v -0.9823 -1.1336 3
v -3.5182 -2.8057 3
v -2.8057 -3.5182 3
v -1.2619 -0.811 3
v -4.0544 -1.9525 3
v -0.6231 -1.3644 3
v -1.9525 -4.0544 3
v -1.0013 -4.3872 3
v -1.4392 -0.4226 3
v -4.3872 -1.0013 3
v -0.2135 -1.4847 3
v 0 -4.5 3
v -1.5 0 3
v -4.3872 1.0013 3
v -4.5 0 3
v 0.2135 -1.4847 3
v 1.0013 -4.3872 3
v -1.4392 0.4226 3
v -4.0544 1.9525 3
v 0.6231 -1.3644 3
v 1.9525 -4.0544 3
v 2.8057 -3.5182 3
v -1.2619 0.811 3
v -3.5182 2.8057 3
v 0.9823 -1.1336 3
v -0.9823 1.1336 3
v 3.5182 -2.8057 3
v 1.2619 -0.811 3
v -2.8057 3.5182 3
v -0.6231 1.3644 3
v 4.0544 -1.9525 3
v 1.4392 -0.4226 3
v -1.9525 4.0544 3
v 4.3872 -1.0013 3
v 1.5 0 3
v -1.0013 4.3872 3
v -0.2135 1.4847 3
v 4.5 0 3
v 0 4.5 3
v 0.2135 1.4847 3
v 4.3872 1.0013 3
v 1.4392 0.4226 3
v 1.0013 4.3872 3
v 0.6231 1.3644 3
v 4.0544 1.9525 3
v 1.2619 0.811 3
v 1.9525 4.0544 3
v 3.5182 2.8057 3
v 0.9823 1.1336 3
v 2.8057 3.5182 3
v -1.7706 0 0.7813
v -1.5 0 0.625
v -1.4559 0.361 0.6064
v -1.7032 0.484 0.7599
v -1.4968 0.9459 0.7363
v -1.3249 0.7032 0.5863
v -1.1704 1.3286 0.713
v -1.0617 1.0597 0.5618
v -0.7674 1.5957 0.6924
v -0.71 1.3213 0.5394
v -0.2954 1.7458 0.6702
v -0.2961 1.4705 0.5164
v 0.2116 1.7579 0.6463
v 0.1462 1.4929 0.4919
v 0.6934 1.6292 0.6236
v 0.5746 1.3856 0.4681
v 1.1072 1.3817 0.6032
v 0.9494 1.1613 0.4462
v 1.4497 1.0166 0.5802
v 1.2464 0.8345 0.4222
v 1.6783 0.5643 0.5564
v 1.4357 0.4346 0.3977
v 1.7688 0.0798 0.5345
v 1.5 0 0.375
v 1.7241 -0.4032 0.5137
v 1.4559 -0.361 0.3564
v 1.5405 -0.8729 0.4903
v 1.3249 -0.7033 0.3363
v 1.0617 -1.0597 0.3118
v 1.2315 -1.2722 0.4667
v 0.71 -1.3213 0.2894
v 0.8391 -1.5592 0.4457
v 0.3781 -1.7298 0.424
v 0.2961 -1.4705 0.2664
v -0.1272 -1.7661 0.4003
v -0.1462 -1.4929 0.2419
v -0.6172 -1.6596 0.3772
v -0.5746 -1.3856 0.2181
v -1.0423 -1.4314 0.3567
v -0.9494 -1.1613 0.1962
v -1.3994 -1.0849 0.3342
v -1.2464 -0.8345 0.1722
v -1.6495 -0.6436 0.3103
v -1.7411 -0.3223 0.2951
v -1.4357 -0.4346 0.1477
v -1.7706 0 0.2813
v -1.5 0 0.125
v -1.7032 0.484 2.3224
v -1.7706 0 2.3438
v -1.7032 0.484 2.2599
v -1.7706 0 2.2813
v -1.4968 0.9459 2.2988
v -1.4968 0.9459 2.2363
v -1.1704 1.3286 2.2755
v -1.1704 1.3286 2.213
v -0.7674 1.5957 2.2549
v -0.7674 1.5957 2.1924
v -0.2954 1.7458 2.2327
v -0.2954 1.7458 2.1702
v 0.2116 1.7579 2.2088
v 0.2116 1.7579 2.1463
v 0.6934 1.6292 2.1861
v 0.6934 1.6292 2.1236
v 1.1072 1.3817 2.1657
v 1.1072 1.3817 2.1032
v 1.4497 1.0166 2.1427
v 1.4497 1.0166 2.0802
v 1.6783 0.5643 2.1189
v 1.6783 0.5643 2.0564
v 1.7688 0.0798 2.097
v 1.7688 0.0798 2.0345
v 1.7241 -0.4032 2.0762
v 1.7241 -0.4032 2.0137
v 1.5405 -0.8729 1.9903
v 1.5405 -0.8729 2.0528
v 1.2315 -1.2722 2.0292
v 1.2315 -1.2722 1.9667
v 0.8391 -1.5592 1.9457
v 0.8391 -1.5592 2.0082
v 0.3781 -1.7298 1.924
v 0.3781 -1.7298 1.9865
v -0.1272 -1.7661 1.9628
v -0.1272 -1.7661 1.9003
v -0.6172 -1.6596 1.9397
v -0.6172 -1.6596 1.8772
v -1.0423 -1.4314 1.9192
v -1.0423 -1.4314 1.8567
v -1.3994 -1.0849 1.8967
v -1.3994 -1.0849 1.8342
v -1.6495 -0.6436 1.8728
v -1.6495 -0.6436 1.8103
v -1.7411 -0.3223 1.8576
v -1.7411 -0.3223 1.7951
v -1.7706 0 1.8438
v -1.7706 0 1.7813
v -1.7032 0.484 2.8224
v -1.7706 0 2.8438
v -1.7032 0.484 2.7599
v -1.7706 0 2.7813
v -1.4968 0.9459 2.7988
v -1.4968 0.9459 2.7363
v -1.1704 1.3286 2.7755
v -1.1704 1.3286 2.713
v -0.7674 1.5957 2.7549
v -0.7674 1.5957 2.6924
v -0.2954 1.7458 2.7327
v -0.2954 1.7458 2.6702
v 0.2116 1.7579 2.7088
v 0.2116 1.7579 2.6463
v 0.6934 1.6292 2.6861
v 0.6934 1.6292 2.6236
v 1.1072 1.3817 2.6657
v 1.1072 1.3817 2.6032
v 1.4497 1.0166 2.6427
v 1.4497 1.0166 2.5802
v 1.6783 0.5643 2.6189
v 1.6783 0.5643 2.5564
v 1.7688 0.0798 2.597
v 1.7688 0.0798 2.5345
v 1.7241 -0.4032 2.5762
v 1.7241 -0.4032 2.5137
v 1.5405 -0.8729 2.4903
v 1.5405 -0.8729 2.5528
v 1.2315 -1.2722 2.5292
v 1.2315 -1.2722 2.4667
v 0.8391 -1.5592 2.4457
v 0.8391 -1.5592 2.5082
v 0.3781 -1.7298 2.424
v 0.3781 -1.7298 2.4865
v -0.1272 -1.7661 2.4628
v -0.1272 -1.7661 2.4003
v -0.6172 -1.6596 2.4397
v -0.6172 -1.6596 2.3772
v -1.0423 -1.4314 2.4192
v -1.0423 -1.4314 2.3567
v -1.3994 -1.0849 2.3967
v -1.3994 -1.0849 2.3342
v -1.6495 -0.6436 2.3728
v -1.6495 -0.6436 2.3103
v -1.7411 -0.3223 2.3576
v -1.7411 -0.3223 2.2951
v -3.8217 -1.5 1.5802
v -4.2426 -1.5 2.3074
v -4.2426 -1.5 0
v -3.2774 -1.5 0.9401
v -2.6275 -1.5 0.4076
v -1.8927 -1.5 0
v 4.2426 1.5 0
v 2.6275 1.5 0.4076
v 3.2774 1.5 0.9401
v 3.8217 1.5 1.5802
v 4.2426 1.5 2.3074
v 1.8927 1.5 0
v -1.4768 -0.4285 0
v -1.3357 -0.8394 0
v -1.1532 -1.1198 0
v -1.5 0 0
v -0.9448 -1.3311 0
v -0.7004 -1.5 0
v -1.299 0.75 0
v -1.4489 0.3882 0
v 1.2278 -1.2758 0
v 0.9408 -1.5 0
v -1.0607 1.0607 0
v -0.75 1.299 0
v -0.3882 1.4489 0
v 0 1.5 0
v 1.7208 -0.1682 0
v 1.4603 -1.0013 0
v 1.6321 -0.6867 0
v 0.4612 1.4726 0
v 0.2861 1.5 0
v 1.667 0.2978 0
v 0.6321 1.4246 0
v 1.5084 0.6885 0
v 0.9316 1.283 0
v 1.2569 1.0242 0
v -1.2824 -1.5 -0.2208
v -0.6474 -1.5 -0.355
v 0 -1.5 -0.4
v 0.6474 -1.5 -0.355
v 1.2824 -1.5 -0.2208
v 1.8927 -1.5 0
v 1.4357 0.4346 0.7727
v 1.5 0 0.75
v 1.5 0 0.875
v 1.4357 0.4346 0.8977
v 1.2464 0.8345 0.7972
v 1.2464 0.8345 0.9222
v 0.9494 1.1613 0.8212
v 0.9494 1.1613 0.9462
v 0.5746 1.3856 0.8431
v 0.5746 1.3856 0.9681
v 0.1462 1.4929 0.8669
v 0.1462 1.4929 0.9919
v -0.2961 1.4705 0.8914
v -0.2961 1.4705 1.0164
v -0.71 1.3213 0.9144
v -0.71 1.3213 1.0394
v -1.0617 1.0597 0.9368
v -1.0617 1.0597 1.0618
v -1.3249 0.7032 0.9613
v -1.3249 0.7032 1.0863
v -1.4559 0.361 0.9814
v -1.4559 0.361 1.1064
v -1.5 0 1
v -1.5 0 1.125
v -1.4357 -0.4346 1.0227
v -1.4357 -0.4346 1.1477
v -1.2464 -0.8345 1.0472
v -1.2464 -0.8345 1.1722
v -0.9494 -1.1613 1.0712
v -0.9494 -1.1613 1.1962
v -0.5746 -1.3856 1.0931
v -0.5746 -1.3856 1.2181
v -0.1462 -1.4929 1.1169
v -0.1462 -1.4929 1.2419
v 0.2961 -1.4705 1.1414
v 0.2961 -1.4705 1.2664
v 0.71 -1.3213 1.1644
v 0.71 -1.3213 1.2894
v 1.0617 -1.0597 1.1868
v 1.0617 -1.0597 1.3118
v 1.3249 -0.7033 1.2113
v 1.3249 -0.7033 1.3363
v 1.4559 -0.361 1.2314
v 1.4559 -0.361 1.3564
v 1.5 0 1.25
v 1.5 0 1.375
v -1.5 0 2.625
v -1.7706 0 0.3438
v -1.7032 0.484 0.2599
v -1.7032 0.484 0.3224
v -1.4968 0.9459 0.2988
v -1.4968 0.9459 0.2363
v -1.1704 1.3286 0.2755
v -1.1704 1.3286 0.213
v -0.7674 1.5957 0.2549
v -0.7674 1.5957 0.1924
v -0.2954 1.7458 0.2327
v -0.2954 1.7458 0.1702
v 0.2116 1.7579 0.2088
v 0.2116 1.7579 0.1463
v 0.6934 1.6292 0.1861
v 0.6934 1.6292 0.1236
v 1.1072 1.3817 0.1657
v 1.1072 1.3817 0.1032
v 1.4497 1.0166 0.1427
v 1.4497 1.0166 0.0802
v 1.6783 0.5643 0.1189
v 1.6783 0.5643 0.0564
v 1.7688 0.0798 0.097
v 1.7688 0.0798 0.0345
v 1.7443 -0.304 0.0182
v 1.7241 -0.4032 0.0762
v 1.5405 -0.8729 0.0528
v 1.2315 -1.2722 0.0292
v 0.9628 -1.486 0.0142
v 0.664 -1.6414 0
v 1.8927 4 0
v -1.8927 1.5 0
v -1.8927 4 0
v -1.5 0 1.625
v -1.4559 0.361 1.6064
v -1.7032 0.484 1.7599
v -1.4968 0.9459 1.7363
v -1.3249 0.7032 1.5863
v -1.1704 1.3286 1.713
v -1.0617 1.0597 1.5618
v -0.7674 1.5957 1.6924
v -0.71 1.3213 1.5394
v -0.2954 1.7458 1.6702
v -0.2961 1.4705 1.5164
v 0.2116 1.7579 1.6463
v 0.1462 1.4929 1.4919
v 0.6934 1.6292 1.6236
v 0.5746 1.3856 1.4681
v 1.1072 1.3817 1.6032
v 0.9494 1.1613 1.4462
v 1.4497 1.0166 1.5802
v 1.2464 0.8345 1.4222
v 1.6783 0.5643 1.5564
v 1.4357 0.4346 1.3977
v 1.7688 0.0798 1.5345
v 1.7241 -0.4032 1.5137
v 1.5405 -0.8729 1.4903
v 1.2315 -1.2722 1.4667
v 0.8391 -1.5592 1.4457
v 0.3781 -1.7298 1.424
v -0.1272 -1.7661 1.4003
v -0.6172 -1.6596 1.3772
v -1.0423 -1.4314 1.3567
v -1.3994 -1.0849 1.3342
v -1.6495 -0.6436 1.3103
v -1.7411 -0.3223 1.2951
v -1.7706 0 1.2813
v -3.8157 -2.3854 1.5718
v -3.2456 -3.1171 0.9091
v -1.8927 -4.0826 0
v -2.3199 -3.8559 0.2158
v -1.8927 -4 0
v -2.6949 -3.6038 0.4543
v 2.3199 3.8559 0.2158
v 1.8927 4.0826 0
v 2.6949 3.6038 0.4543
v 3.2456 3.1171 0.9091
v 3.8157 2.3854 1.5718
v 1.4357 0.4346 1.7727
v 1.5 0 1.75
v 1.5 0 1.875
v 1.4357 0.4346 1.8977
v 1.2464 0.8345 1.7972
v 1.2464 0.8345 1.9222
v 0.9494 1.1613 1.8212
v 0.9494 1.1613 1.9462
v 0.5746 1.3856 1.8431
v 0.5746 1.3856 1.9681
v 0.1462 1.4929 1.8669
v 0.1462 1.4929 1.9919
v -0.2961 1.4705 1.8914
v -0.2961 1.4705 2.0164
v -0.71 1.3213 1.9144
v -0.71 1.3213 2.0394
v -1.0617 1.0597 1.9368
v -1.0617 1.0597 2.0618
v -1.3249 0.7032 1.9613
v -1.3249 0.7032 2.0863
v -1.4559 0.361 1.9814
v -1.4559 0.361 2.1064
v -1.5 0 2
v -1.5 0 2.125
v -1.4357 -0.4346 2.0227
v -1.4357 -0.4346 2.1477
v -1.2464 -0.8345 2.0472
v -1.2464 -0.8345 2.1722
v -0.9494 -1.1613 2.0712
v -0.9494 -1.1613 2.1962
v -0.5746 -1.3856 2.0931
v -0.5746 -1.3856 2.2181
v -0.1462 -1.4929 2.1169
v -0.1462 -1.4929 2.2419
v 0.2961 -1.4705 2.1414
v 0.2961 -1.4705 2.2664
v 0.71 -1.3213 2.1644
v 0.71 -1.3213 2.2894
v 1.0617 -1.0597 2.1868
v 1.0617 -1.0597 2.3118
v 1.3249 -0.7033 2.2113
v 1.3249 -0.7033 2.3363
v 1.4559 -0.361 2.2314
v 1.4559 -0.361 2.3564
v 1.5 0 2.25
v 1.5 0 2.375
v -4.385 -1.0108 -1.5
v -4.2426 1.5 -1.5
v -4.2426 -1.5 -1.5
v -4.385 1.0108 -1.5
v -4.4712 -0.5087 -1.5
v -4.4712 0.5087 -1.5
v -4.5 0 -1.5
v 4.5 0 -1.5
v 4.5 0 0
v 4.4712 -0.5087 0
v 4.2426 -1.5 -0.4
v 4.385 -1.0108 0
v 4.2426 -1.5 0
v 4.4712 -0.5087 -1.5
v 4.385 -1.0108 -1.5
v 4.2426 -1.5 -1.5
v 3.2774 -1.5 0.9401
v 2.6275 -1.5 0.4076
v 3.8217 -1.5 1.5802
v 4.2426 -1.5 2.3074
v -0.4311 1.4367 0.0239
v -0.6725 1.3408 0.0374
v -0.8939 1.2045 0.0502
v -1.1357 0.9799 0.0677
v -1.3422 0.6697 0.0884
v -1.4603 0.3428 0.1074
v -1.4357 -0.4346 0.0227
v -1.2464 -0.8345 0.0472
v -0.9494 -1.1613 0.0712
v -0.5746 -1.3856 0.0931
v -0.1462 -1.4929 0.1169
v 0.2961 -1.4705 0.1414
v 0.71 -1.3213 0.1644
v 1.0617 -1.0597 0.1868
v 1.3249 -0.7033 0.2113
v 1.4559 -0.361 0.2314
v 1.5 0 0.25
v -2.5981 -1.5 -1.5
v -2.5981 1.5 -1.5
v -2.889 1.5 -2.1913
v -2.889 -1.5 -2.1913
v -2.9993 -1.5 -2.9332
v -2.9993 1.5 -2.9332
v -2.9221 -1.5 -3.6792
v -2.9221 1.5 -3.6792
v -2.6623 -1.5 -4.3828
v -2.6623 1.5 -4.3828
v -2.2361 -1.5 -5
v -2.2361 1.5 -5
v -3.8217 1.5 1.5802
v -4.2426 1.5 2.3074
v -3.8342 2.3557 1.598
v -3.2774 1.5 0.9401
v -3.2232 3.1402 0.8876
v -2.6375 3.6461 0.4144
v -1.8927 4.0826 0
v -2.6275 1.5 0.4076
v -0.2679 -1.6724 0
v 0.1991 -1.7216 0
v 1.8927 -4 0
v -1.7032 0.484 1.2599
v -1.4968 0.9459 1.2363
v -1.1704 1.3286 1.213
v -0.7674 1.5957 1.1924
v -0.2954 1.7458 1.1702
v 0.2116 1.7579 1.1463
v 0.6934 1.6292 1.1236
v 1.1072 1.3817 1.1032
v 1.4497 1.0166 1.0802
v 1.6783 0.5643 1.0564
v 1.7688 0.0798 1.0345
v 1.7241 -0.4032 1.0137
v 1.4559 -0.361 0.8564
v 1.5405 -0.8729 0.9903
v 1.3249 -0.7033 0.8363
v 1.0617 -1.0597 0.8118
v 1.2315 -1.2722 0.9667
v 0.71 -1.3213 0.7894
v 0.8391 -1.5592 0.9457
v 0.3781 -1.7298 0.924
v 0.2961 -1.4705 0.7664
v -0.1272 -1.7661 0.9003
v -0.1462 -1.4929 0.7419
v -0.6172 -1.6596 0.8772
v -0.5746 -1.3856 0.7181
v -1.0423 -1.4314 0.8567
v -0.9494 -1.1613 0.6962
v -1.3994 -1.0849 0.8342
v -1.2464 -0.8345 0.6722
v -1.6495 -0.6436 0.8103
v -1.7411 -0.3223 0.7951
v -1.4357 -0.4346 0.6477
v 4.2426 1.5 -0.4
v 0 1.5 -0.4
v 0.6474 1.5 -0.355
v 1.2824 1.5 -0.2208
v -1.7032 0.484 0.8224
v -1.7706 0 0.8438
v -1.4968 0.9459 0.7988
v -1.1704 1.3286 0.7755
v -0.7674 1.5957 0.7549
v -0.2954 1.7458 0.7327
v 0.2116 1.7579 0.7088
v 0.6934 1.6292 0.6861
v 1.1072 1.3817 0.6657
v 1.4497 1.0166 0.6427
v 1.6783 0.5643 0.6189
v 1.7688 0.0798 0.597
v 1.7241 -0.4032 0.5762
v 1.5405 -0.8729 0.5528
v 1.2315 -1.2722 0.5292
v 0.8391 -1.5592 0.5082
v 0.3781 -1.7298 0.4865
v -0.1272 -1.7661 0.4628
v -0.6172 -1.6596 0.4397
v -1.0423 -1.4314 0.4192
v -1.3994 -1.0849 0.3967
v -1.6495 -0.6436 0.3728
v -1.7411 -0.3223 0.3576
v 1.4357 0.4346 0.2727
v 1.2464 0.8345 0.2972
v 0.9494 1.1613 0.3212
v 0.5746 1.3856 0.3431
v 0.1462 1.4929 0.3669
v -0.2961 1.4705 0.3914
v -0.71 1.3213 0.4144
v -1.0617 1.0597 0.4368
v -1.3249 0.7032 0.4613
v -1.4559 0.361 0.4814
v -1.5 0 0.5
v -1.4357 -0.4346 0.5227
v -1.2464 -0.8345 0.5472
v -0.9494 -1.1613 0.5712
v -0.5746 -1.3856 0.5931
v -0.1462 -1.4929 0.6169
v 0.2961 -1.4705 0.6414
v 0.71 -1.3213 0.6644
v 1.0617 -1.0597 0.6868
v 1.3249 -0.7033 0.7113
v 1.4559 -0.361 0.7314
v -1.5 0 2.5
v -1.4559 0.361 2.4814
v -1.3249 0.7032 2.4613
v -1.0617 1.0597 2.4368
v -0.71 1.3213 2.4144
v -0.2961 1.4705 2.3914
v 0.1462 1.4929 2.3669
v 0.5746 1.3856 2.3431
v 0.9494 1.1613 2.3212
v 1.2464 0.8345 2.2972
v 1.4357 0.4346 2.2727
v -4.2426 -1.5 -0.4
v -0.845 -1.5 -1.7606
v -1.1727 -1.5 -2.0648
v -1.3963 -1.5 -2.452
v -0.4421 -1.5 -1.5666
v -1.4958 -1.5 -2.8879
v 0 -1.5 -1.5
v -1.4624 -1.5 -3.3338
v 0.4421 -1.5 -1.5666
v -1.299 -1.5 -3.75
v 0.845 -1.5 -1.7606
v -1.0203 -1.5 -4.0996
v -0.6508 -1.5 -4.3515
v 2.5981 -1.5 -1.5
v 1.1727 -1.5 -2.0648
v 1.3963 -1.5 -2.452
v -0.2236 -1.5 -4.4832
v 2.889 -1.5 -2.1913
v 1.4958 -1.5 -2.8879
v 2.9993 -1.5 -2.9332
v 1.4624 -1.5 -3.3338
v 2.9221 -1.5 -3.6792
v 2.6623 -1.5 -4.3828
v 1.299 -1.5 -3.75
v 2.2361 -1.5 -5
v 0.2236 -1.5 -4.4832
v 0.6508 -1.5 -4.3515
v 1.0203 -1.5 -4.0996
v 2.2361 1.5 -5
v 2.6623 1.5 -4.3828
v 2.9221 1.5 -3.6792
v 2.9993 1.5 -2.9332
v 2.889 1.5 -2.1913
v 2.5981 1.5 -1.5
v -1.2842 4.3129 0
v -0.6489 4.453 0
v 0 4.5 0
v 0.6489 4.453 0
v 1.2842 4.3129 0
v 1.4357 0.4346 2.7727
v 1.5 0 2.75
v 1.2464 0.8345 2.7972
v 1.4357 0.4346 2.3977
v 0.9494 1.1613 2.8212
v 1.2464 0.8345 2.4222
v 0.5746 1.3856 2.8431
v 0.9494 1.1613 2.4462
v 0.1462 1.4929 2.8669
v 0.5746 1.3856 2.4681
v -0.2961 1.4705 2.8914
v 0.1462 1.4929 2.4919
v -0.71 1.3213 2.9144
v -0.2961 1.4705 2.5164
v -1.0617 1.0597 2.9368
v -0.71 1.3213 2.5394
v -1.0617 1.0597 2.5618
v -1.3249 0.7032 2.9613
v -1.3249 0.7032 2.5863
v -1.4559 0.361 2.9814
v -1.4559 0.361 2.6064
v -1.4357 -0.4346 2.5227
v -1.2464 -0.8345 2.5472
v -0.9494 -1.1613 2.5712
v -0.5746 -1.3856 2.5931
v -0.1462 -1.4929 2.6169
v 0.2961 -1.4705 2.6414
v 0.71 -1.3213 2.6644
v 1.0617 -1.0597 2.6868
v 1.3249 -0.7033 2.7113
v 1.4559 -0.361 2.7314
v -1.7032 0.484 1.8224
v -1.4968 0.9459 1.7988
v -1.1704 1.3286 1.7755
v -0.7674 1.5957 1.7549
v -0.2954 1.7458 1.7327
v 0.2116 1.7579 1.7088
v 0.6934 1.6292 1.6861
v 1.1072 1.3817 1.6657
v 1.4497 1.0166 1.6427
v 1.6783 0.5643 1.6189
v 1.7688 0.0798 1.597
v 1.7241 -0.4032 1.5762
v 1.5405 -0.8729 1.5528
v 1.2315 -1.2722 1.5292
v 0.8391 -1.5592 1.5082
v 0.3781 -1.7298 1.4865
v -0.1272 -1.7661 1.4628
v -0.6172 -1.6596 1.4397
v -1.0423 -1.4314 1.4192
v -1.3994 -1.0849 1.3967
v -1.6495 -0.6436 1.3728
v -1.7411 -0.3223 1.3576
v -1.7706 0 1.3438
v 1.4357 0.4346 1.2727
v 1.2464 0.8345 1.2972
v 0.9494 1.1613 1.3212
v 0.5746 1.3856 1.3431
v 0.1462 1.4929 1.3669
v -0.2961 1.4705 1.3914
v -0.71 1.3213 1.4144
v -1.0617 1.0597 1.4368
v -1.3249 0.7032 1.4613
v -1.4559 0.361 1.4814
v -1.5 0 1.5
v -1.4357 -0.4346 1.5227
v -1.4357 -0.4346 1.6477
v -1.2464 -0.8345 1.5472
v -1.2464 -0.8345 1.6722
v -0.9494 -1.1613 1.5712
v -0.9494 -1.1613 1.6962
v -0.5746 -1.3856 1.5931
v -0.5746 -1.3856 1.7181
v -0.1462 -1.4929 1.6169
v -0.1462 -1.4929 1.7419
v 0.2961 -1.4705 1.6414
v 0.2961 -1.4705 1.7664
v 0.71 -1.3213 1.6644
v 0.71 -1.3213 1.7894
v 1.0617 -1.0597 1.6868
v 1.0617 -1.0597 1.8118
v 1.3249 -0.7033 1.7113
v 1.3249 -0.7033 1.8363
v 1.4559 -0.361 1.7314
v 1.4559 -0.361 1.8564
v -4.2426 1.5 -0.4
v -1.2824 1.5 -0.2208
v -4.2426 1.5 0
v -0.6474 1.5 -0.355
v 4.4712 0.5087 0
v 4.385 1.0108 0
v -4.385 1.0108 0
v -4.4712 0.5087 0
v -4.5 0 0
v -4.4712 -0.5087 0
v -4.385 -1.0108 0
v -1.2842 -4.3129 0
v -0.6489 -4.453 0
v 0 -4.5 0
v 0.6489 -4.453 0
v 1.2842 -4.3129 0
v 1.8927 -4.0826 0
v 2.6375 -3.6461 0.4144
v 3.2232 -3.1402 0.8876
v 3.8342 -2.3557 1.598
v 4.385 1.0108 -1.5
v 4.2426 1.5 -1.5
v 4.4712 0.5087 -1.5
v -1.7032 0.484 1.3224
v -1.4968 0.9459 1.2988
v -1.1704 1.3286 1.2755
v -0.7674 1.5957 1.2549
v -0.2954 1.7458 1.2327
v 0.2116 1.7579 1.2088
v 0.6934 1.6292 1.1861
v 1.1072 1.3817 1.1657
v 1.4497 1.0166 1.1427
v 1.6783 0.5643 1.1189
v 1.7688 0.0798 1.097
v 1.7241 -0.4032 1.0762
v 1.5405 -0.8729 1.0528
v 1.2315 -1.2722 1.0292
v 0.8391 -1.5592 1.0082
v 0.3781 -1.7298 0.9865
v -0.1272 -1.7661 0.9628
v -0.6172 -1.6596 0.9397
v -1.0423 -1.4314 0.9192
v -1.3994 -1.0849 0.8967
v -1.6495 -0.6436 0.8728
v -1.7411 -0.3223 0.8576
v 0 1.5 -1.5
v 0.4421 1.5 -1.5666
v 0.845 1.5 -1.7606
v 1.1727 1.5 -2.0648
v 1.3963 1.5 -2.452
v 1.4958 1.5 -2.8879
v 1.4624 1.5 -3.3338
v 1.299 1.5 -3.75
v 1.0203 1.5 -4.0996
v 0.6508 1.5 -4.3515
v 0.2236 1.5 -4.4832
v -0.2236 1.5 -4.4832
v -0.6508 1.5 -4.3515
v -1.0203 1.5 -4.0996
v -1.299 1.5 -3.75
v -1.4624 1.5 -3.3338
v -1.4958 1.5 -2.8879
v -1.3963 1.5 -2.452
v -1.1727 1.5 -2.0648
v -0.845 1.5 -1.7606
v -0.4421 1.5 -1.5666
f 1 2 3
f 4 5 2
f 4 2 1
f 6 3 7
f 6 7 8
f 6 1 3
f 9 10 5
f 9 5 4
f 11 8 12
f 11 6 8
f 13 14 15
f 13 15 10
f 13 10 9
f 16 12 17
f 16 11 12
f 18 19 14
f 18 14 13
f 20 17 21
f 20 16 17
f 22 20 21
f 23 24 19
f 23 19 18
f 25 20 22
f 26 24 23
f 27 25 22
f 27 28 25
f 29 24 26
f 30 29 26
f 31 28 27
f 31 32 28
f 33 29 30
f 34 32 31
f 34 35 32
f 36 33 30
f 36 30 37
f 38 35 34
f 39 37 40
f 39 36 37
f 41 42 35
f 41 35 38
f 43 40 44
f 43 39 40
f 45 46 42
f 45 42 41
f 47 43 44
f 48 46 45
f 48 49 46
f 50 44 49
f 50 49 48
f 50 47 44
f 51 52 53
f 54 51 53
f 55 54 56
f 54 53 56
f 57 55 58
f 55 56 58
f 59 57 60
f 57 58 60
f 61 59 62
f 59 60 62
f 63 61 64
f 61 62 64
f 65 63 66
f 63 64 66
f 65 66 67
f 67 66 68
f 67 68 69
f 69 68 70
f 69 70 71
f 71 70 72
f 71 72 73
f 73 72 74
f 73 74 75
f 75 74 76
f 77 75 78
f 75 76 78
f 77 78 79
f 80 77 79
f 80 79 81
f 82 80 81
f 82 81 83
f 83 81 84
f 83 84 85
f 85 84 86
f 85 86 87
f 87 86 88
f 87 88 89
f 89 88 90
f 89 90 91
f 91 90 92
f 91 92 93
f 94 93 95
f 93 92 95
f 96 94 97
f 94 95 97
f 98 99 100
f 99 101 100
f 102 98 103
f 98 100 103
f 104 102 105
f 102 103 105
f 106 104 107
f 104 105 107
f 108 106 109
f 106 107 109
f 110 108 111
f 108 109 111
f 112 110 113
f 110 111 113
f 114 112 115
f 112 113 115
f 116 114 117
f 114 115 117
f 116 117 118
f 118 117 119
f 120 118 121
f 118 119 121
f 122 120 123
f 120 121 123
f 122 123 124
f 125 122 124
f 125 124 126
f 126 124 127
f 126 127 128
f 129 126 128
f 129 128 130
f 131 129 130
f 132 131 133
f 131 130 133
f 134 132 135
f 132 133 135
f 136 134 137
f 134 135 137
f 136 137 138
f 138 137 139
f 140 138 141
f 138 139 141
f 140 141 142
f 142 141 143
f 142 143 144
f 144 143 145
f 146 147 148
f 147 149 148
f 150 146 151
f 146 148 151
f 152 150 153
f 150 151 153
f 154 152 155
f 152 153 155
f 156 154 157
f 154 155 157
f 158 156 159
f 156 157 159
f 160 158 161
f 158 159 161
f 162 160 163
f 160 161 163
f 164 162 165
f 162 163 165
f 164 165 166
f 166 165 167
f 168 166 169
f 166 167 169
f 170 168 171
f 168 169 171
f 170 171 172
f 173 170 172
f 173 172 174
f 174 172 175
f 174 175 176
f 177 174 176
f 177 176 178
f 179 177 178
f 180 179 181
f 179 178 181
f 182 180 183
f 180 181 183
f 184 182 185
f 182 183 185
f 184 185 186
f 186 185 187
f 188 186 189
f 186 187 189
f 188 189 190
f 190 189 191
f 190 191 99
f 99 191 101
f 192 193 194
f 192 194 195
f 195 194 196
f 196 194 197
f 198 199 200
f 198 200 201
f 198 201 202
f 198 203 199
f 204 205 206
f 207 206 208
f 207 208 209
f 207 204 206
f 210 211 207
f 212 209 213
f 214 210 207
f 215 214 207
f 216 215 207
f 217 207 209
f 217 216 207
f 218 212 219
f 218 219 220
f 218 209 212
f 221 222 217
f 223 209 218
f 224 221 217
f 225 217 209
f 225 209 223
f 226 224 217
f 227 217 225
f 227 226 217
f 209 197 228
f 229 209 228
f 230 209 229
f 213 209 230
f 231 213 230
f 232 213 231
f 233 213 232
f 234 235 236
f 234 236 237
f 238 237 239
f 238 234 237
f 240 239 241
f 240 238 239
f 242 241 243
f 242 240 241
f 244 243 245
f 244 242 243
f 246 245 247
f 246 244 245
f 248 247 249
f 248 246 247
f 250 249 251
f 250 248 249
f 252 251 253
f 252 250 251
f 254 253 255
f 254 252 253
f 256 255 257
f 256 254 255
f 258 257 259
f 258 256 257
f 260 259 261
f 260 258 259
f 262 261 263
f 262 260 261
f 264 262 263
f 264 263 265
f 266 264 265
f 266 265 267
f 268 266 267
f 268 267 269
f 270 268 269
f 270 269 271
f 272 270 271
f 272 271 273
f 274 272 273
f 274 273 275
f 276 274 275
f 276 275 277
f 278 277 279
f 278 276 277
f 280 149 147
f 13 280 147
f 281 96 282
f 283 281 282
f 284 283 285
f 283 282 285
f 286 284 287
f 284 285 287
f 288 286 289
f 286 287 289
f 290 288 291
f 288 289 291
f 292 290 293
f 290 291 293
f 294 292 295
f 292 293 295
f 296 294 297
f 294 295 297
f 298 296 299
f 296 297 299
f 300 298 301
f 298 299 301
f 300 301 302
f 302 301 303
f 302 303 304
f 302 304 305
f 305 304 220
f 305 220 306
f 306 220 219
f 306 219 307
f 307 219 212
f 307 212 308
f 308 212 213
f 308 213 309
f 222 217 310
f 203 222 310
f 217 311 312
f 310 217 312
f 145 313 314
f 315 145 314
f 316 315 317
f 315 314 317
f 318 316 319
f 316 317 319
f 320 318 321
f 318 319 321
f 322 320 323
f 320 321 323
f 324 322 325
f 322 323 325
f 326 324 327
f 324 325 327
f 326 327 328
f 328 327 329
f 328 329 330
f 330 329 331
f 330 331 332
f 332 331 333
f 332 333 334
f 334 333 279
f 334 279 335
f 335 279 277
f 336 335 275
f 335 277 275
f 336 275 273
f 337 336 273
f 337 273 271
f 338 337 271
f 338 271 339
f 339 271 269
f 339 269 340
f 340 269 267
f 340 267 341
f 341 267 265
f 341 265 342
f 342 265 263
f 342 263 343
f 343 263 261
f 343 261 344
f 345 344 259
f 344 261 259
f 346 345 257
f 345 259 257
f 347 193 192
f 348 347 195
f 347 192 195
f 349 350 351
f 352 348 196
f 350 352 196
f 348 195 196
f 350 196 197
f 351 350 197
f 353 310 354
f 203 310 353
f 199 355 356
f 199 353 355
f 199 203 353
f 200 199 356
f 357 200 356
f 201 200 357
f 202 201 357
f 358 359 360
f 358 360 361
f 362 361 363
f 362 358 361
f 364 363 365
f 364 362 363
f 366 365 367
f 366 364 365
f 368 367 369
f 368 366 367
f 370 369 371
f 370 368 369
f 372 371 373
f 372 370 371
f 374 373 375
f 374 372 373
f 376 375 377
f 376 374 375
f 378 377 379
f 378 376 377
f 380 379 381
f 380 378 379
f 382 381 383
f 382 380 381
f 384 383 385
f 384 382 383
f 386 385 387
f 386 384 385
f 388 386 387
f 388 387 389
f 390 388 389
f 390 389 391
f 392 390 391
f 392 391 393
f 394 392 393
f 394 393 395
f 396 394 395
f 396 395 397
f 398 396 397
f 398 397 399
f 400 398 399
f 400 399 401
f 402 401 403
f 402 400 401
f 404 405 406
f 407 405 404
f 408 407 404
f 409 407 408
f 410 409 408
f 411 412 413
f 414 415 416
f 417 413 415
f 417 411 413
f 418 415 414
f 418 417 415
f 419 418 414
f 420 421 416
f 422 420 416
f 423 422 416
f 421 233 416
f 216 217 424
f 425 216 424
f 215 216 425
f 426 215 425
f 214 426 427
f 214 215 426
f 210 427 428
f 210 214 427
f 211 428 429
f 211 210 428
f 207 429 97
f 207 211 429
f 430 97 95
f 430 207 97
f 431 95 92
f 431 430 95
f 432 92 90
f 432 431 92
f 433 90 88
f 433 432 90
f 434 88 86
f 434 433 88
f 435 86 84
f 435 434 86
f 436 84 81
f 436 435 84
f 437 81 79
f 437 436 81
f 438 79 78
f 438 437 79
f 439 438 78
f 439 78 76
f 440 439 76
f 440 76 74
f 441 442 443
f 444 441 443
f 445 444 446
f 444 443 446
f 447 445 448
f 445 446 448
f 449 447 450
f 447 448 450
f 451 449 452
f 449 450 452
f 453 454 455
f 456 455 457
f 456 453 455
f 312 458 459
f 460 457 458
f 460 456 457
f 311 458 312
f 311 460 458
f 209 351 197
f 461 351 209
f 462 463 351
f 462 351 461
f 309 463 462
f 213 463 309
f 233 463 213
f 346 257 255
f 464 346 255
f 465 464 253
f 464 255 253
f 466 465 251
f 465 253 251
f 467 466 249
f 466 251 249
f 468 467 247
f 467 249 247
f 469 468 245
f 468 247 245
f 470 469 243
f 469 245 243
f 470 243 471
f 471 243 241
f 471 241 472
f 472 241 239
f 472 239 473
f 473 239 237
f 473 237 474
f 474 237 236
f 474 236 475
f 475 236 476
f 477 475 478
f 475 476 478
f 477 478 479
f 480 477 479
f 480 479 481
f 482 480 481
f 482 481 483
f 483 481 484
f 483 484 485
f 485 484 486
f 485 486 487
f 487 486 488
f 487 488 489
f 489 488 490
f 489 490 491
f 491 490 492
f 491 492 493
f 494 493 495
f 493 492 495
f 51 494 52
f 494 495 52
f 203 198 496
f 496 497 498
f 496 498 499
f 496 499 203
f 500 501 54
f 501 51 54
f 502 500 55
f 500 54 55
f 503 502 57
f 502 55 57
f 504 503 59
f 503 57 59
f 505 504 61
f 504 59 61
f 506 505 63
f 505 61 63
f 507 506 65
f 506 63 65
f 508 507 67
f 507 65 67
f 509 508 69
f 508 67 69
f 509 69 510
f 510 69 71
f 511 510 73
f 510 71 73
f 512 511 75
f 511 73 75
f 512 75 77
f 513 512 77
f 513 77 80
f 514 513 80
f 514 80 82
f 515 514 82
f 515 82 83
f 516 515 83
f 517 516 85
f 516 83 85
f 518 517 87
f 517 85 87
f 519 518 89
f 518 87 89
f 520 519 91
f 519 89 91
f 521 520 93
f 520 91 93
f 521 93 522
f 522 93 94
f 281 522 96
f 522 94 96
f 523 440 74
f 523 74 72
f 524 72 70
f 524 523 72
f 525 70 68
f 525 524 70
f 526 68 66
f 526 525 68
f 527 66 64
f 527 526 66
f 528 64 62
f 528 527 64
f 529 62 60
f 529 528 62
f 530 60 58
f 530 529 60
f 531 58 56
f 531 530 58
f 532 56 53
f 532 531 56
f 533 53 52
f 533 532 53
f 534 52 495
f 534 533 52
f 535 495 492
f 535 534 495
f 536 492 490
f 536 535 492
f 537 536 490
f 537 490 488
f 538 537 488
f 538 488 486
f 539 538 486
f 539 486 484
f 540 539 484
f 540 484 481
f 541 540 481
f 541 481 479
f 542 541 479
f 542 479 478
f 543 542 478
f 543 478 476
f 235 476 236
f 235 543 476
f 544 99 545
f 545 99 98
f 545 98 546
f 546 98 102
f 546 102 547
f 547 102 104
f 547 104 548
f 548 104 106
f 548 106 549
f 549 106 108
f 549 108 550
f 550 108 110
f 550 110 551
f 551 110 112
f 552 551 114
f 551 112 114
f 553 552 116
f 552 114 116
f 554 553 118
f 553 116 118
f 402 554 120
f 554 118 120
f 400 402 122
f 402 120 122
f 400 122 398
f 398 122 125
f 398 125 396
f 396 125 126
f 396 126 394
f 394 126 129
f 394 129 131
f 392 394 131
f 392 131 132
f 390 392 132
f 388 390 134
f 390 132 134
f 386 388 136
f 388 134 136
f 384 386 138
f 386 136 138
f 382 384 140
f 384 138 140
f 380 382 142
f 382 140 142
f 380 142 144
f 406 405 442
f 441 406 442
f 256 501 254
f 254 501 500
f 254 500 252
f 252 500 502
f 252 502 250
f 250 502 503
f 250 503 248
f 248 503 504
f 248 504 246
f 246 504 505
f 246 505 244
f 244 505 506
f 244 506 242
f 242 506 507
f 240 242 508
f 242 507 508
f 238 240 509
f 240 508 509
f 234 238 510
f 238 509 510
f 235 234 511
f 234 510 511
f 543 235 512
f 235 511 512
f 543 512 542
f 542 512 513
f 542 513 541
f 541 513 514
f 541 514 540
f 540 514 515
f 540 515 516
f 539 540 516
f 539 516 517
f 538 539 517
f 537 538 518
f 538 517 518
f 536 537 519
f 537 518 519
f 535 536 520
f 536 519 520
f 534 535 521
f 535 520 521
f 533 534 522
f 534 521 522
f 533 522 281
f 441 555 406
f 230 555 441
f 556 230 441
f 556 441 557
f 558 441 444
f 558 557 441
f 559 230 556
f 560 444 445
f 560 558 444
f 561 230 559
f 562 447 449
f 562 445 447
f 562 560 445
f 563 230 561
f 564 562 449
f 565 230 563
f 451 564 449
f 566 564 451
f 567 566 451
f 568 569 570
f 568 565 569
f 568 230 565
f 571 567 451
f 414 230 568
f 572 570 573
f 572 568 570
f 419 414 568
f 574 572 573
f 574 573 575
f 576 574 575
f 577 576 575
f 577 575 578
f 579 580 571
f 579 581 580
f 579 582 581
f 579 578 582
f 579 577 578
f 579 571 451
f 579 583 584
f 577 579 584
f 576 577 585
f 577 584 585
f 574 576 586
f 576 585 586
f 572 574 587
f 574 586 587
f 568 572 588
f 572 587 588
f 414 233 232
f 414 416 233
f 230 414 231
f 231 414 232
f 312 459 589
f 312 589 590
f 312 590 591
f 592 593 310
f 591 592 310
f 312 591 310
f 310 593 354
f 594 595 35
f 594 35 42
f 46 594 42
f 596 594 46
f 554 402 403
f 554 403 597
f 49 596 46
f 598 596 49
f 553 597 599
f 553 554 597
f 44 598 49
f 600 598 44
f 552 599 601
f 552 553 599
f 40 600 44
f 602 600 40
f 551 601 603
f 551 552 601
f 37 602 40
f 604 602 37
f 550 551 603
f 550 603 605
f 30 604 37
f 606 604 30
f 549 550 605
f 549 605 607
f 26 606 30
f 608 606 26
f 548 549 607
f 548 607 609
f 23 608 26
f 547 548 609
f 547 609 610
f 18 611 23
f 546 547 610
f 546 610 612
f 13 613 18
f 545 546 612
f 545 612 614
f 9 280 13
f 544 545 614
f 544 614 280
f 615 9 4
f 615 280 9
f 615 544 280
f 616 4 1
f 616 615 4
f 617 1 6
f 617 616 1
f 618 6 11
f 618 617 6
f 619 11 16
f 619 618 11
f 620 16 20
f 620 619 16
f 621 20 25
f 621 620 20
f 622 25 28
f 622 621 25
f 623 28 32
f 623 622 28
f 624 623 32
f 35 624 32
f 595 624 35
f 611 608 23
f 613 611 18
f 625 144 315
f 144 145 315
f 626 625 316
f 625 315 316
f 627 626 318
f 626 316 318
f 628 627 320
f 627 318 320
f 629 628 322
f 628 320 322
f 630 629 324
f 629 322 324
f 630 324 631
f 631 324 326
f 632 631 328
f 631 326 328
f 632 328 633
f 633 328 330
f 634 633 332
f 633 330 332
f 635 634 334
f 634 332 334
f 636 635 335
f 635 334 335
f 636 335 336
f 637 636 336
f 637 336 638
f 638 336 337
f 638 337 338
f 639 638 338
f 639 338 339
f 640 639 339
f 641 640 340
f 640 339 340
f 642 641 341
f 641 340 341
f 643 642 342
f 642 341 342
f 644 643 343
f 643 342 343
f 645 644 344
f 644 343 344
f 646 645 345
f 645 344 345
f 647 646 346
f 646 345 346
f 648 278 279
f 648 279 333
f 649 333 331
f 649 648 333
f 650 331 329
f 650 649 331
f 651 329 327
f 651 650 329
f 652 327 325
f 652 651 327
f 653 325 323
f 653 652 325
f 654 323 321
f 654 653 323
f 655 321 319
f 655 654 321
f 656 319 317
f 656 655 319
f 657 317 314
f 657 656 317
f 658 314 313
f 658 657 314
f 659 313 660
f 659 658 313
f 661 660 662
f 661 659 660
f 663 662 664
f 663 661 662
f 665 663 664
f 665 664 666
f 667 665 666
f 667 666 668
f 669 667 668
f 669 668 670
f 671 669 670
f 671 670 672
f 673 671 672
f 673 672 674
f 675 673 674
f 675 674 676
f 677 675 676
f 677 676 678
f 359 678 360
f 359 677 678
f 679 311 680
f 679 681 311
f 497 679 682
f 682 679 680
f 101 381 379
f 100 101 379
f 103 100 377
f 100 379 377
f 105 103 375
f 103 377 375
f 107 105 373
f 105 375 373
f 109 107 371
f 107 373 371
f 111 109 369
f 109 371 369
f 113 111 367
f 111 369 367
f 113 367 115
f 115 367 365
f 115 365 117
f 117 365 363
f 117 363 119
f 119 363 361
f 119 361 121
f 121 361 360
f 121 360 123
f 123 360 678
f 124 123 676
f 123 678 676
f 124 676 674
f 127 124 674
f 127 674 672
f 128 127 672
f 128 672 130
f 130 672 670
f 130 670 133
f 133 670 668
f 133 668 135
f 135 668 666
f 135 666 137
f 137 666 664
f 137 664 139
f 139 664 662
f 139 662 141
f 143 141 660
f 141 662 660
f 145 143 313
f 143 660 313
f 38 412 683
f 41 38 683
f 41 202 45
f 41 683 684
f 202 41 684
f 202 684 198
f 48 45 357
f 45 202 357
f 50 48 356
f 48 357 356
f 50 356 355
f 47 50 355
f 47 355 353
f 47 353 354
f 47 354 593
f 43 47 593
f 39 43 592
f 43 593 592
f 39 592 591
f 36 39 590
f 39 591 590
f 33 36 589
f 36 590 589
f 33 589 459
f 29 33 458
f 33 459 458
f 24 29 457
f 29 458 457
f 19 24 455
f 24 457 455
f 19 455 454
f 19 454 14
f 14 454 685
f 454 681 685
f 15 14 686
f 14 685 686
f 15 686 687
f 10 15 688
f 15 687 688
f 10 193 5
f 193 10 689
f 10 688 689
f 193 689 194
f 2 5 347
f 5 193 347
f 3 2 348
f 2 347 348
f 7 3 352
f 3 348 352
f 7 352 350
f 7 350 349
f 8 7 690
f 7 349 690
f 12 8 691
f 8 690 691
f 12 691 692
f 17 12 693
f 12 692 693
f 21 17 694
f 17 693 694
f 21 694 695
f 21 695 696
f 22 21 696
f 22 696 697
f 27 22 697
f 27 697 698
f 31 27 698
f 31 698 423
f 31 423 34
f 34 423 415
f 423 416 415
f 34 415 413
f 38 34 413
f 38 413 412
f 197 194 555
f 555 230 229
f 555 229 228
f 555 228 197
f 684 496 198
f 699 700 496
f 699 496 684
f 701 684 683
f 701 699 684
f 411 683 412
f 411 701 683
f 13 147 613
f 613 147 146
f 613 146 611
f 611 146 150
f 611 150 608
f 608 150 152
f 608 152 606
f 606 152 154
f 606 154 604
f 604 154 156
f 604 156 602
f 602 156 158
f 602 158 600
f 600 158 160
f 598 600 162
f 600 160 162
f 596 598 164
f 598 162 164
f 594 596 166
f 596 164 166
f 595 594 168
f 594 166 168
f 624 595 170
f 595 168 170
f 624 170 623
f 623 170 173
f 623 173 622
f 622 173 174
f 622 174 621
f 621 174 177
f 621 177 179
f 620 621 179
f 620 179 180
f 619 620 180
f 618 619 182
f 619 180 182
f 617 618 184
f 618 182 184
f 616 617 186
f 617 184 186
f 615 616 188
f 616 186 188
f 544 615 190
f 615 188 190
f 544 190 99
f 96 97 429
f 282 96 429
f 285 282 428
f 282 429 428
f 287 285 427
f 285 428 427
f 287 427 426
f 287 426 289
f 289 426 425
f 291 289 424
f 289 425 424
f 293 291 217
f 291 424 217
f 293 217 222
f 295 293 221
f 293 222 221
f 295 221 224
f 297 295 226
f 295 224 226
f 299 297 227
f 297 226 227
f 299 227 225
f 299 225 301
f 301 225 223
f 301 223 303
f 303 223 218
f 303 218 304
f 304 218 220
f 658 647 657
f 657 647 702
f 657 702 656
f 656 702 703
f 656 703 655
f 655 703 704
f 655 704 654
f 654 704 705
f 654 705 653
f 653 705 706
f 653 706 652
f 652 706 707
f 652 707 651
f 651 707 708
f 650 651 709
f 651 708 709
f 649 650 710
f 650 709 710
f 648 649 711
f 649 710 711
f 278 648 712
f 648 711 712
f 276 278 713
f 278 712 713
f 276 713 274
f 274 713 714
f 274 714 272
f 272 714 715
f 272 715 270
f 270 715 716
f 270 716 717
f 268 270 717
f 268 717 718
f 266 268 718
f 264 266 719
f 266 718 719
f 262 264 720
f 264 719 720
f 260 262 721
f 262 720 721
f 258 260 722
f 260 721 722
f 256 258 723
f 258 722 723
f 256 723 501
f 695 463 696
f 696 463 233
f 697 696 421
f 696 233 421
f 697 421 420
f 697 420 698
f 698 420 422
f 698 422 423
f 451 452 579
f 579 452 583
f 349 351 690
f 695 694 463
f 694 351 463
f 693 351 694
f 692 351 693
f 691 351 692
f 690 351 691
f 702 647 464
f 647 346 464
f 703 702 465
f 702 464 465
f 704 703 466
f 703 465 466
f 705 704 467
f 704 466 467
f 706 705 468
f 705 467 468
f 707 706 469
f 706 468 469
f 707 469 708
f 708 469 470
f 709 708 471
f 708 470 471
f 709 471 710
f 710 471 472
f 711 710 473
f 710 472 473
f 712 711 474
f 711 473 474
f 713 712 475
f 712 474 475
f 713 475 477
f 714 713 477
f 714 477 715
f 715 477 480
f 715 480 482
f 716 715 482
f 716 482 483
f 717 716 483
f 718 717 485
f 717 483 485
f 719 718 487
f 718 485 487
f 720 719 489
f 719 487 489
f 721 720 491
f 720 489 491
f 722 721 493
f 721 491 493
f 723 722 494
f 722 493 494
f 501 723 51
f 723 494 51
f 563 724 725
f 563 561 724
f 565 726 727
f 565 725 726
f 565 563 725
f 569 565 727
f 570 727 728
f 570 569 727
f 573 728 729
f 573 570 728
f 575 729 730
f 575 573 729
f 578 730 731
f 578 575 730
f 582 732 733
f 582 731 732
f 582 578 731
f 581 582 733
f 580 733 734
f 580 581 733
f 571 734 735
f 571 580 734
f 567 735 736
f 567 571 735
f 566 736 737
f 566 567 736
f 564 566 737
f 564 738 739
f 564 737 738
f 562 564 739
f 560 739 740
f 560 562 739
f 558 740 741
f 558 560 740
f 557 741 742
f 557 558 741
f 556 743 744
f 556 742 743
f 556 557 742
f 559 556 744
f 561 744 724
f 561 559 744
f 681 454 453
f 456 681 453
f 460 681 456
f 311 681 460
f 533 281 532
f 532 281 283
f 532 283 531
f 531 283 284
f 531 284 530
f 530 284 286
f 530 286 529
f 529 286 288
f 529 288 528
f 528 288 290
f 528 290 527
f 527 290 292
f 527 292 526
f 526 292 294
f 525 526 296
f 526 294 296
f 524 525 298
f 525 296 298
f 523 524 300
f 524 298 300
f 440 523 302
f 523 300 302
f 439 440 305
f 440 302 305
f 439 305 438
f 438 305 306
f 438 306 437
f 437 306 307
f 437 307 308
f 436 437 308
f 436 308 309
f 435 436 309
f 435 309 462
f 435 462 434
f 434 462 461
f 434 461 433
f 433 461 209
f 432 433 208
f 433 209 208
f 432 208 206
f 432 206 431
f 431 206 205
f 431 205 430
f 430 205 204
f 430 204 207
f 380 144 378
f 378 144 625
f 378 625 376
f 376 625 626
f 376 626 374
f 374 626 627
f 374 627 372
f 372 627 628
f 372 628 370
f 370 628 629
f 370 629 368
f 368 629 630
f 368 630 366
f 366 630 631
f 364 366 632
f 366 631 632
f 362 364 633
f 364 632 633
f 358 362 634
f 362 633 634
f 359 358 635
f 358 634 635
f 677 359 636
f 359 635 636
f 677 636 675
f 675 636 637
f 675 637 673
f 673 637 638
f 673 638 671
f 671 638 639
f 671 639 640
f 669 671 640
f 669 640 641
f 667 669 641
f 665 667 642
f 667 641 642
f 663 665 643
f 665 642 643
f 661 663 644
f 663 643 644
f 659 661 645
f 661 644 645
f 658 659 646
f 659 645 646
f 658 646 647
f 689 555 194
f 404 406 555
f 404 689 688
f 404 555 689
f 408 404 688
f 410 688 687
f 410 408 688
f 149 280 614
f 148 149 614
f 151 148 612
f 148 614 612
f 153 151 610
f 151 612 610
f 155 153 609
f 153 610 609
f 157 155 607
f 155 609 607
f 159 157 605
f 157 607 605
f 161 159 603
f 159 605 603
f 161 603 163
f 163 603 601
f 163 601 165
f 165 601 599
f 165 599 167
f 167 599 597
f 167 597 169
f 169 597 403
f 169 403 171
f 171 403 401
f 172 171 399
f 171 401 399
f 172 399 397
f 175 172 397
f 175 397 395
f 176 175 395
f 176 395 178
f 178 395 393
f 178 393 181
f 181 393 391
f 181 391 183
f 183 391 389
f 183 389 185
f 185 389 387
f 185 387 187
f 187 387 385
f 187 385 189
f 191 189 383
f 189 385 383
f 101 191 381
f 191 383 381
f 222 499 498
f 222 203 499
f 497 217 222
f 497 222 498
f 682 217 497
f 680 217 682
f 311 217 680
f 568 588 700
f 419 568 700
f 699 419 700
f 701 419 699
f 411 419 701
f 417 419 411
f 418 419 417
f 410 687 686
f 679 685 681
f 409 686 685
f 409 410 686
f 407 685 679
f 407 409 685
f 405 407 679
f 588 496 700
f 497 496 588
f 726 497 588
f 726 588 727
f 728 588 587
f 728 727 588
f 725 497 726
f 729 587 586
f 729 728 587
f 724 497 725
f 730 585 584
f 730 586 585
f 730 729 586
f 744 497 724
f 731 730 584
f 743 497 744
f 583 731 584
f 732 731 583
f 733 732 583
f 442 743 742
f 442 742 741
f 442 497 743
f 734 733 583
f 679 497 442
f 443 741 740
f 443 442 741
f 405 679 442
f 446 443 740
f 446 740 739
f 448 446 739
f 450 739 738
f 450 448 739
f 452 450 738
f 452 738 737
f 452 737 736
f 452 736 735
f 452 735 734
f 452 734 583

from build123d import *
from build123d.topology import SkipClean

# Parameters (mm, degrees)
CROQUIS1_R              = 4.5
CROQUIS1_R_2            = 1.5
SALIENTE_EXTRUIR2_DEPTH = 3
ROSCA1_PITCH            = 0.5
CROQUIS5_W              = 9
CROQUIS5_H              = 5
CROQUIS5_R              = 1.5
SALIENTE_EXTRUIR3_DEPTH = 4
CORTAR_EXTRUIR3_START   = -10
CORTAR_EXTRUIR3_DEPTH   = 10
CROQUIS7_W              = 5
CROQUIS7_H              = 3
CORTAR_EXTRUIR4_DEPTH   = 10
CORTAR_EXTRUIR6_DEPTH   = 10
CROQUIS10_W             = 0.257359313
CROQUIS10_H             = 3.5
CORTAR_EXTRUIR7_DEPTH   = 10


with BuildPart() as part:
    # Croquis1 → Saliente-Extruir2 (new body)
    with BuildSketch(Plane.XY):
        Circle(CROQUIS1_R)
        Circle(CROQUIS1_R_2, mode=Mode.SUBTRACT)
    extrude(amount=SALIENTE_EXTRUIR2_DEPTH)

    # Rosca1: the profile of Perfil de rosca1 profile screwed along a right-hand helix of 6 turns, 6 arcs to a turn; built about Z, then put on its axis
    rosca1_z = Axis((0, 0, 0), (0, 0, 1))
    rosca1_corners = [(1.4997, 0, -0.000173205), (1.770632938, 0, 0.156249999), (1.770632938, 0, 0.218749999), (1.4997, 0, 0.375173204)]
    with BuildLine(mode=Mode.PRIVATE) as rosca1_profile:
        Line(rosca1_corners[0], rosca1_corners[1])
        Line(rosca1_corners[1], rosca1_corners[2])
        Line(rosca1_corners[2], rosca1_corners[3])
        Line(rosca1_corners[3], rosca1_corners[0])
    rosca1_cap = Face(rosca1_profile.wire())
    rosca1_turn_angles = [0, 30, 60, 90, 120, 150, 180, 210, 240, 270, 300, 330, 360]
    rosca1_turn_weights = [1, 0.8660254037844387, 1, 0.8660254037844387, 1, 0.8660254037844387, 1, 0.8660254037844387, 1, 0.8660254037844387, 1, 0.8660254037844387, 1]
    rosca1_turn_rails = [Edge.make_bspline([Vector(p[0], p[1], 0).rotate(rosca1_z, rosca1_turn_angles[k]) / rosca1_turn_weights[k] + Vector(0, 0, p[2] + ROSCA1_PITCH * rosca1_turn_angles[k] / 360) for k in range(13)], [0, 0, 0, 1, 1, 2, 2, 3, 3, 4, 4, 5, 5, 6, 6, 6], 2, rosca1_turn_weights) for p in rosca1_corners]
    rosca1_turn_sides = [Face.make_surface_from_curves(rosca1_turn_rails[p[0]], rosca1_turn_rails[p[1]]) for p in [(0, 1), (1, 2), (2, 3), (3, 0)]]
    rosca1 = Plane(origin=(0, 0, 3), x_dir=(-1, 0, 0), z_dir=(0, 0, -1)) * Solid(Shell([*[p.moved(Location((0, 0, ROSCA1_PITCH * i))) for i in range(6) for p in rosca1_turn_sides], rosca1_cap, rosca1_cap.rotate(rosca1_z, 2160).moved(Location((0, 0, ROSCA1_PITCH * 2160 / 360)))]))
    add(rosca1, mode=Mode.SUBTRACT)

    # Croquis5 → Saliente-Extruir3 (add, symmetric)
    with BuildSketch(Plane(origin=(0, 0, 0), x_dir=(1, 0, 0), z_dir=(0, 1, 0))):
        with Locations((0, 2.5)):
            Rectangle(CROQUIS5_W, CROQUIS5_H)
        with Locations(Location((0, 3, 0), (0, 0, 270))):
            Circle(CROQUIS5_R, mode=Mode.SUBTRACT)
    extrude(amount=SALIENTE_EXTRUIR3_DEPTH, both=True)

    # Croquis6 → Cortar-Extruir3 (cut)
    with SkipClean():  # the faces are left unmerged after this step: merging them gives an invalid solid
        with BuildSketch(Plane.XY.offset(CORTAR_EXTRUIR3_START)):
            with BuildLine():
                Line((-4.5, 4), (-4.5, 0))
                ThreePointArc((-4.5, 0), (-3.842329219, 2.342329219), (-2.061552813, 4))
                Line((-2.061552813, 4), (-4.5, 4))
            make_face()
            with BuildLine():
                Line((4.5, 4), (2.061552813, 4))
                ThreePointArc((2.061552813, 4), (3.842329219, 2.342329219), (4.5, 0))
                Line((4.5, 0), (4.5, 4))
            make_face()
            with BuildLine():
                Line((4.5, -4), (4.5, 0))
                ThreePointArc((4.5, 0), (3.842329219, -2.342329219), (2.061552813, -4))
                Line((2.061552813, -4), (4.5, -4))
            make_face()
            with BuildLine():
                Line((-4.5, 0), (-4.5, -4))
                Line((-4.5, -4), (-2.061552813, -4))
                ThreePointArc((-2.061552813, -4), (-3.842329219, -2.342329219), (-4.5, 0))
            make_face()
        extrude(amount=CORTAR_EXTRUIR3_DEPTH, mode=Mode.SUBTRACT)

    # Croquis7 → Cortar-Extruir4 (cut, symmetric)
    with SkipClean():  # the faces are left unmerged after this step: merging them gives an invalid solid
        with BuildSketch(Plane(origin=(0, 0, 0), x_dir=(0, 0, -1), z_dir=(1, 0, 0))):
            with Locations((2.5, 3)):
                Rectangle(CROQUIS7_W, CROQUIS7_H)
            with Locations((2.5, -3)):
                Rectangle(CROQUIS7_W, CROQUIS7_H)
        extrude(amount=CORTAR_EXTRUIR4_DEPTH, both=True, mode=Mode.SUBTRACT)

    # Croquis9 → Cortar-Extruir6 (cut)
    with SkipClean():  # the faces are left unmerged after this step: merging them gives an invalid solid
        with BuildSketch(Plane(origin=(0, 1.5, 0), x_dir=(1, 0, 0), z_dir=(0, 1, 0))):
            with BuildLine():
                Line((-4.242640687, 0), (-1.892710475, 0))
                ThreePointArc((-1.892710475, 0), (-0.967258097, 0.298907677), (1e-08, 0.4))
                Line((1e-08, 0.4), (-4.242640687, 0.4))
                Line((-4.242640687, 0.4), (-4.242640687, 0))
            make_face()
            with BuildLine():
                Line((-4.5, 0.4), (-4.5, -3))
                ThreePointArc((-4.5, -3), (-3.530819565, -1.20931822), (-1.892710475, 0))
                Line((-1.892710475, 0), (-4.242640687, 0))
                Line((-4.242640687, 0), (-4.242640687, 0.4))
                Line((-4.242640687, 0.4), (-4.5, 0.4))
            make_face()
            with BuildLine():
                ThreePointArc((1e-08, 0.4), (0.967258107, 0.298907675), (1.892710475, 0))
                Line((1.892710475, 0), (4.242640687, 0))
                Line((4.242640687, 0), (4.242640687, 0.4))
                Line((4.242640687, 0.4), (1e-08, 0.4))
            make_face()
            with BuildLine():
                ThreePointArc((1.892710475, 0), (3.530819565, -1.20931822), (4.5, -3))
                Line((4.5, -3), (4.5, 0.4))
                Line((4.5, 0.4), (4.242640687, 0.4))
                Line((4.242640687, 0.4), (4.242640687, 0))
                Line((4.242640687, 0), (1.892710475, 0))
            make_face()
        cortar_extruir6 = extrude(amount=CORTAR_EXTRUIR6_DEPTH, mode=Mode.SUBTRACT)

    # Simetría1: Cortar-Extruir6 across plane
    with SkipClean():  # the faces are left unmerged after this step: merging them gives an invalid solid
        add(cortar_extruir6.mirror(Plane.ZX), mode=Mode.SUBTRACT)

    # Croquis10 → Cortar-Extruir7 (cut)
    with SkipClean():  # the faces are left unmerged after this step: merging them gives an invalid solid
        with BuildSketch(Plane(origin=(0, 1.5, 0), x_dir=(1, 0, 0), z_dir=(0, 1, 0))):
            with BuildLine():
                Line((-4.242640687, 5), (-4.242640687, 1.5))
                Line((-4.242640687, 1.5), (-2.598076211, 1.5))
                ThreePointArc((-2.598076211, 1.5), (-2.984080681, 3.308646222), (-2.236067977, 5))
                Line((-2.236067977, 5), (-4.242640687, 5))
            make_face()
            with BuildLine():
                ThreePointArc((2.236067977, 5), (2.984080681, 3.308646222), (2.598076211, 1.5))
                Line((2.598076211, 1.5), (4.242640687, 1.5))
                Line((4.242640687, 1.5), (4.242640687, 5))
                Line((4.242640687, 5), (2.236067977, 5))
            make_face()
            with Locations((-4.371320344, 3.25)):
                Rectangle(CROQUIS10_W, CROQUIS10_H)
            with Locations((4.371320344, 3.25)):
                Rectangle(CROQUIS10_W, CROQUIS10_H)
        extrude(amount=-CORTAR_EXTRUIR7_DEPTH, mode=Mode.SUBTRACT)


solid = part.part
